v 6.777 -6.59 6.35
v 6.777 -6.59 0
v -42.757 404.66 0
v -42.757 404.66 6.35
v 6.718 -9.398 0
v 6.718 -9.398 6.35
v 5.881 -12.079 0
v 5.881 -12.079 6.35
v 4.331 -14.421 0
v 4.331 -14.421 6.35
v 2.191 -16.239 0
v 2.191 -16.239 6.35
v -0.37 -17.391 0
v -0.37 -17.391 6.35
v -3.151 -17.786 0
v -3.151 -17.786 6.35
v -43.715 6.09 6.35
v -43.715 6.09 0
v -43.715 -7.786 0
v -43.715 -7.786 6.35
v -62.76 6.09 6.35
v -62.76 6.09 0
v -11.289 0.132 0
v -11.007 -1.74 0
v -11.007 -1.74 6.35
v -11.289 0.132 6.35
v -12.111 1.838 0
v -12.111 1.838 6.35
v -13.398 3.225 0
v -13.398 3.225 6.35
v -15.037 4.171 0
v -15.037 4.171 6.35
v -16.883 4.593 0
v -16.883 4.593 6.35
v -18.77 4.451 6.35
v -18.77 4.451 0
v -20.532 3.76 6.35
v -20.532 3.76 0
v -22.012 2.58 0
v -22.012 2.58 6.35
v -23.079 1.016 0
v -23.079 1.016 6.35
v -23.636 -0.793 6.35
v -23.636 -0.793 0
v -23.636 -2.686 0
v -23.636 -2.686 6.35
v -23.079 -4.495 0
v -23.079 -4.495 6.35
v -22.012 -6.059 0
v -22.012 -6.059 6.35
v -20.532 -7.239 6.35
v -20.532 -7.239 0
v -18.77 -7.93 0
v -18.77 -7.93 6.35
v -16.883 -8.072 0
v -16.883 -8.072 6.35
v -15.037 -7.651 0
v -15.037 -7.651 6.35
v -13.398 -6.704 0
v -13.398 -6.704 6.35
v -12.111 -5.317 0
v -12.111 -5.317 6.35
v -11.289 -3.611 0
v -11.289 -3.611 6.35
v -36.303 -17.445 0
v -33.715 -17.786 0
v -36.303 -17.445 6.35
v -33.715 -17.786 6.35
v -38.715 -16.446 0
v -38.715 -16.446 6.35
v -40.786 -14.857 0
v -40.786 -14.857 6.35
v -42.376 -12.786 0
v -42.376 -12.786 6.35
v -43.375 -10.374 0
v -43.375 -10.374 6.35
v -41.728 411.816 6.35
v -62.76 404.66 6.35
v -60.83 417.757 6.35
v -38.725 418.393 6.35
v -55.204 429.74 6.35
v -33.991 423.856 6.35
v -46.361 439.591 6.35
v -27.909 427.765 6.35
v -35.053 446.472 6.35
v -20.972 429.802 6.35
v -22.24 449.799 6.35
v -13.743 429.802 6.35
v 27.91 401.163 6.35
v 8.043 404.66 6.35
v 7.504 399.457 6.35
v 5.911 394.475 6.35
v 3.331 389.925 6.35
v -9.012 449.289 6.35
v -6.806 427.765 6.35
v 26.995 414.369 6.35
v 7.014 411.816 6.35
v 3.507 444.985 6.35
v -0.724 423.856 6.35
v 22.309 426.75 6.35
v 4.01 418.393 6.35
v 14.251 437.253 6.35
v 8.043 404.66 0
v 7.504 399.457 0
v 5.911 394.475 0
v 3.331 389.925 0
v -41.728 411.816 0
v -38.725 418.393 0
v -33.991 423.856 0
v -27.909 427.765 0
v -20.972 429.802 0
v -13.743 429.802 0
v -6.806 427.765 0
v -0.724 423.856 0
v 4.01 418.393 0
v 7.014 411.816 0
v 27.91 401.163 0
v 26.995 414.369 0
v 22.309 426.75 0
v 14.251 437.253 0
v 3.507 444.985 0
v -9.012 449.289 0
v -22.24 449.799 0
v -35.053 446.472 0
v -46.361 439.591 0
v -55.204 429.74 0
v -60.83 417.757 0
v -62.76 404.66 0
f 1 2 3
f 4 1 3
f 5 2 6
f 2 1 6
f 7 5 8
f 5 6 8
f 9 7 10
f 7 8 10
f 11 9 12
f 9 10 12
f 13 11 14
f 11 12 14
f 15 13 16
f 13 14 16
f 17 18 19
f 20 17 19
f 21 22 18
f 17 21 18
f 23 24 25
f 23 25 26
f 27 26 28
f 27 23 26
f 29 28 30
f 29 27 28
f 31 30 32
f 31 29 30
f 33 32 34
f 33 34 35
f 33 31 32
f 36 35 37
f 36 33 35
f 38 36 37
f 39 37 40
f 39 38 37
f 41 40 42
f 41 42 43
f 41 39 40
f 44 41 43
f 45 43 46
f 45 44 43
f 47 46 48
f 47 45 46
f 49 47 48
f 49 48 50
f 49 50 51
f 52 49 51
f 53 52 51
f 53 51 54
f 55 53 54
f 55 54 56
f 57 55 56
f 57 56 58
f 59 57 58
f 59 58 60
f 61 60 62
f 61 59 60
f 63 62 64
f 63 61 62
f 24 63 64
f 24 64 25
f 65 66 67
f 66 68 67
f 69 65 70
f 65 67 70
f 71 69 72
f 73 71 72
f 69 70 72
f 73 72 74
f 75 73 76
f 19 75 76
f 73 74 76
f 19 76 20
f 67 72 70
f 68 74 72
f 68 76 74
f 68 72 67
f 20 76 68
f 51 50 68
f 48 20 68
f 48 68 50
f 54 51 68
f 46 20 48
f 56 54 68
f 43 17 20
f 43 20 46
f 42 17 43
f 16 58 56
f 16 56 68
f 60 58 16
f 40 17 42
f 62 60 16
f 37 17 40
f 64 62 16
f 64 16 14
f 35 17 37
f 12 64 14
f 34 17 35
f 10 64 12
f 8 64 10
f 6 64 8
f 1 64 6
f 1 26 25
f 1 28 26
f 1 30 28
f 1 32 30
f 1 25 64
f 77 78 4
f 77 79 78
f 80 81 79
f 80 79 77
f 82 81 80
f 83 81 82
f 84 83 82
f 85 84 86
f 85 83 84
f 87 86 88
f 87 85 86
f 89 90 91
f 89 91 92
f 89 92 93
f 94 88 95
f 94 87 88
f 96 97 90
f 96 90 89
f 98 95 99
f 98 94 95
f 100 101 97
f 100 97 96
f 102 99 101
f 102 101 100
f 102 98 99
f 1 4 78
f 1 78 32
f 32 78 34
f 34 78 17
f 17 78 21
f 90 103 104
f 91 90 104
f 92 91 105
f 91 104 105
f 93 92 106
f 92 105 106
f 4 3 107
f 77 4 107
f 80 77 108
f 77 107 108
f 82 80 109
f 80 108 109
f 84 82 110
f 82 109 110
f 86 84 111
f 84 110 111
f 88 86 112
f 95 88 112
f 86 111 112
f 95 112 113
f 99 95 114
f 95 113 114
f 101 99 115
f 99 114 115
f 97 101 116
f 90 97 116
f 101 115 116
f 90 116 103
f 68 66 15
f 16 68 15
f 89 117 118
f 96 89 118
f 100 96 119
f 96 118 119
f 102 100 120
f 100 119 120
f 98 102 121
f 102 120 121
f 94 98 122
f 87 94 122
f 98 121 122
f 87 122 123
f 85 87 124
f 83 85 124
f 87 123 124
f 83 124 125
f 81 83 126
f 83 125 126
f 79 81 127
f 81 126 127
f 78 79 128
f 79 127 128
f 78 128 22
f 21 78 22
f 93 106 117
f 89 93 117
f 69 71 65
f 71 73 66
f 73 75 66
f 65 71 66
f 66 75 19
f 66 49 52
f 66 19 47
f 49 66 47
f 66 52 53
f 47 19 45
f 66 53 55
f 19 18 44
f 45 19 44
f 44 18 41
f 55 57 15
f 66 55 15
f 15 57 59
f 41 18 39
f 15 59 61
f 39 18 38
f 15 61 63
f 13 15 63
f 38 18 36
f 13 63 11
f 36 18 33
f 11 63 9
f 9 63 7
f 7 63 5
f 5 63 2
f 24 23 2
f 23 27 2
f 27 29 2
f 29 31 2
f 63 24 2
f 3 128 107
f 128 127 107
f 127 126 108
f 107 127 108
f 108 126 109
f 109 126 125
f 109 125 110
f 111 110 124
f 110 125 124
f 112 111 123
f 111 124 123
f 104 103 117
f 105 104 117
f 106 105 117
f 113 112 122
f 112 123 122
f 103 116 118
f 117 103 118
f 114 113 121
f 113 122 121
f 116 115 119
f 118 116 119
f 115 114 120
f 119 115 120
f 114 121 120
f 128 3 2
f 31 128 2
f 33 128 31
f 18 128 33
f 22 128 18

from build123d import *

# Parameters (mm, degrees)
SKETCH1_R           = 6.35
BOSS_EXTRUDE1_DEPTH = 6.35
FILLET1_R           = 10


with BuildPart() as part:
    # Sketch1 → Boss-Extrude1 (new body)
    with BuildSketch(Plane.XY):
        with BuildLine():
            Line((3.331127109, 389.92455355), (27.90992579, 401.162728042))
            ThreePointArc((27.90992579, 401.162728042), (-15.607198263, 450.028916488), (-62.759573024, 404.660447113))
            Line((-62.759573024, 404.660447113), (-62.759573024, 6.090179643))
            Line((-62.759573024, 6.090179643), (-43.715258354, 6.090179643))
            Line((-43.715258354, 6.090179643), (-43.715258354, -17.785820357))
            Line((-43.715258354, -17.785820357), (8.125653236, -17.785820357))
            Line((8.125653236, -17.785820357), (-42.757358599, 404.660447113))
            ThreePointArc((-42.757358599, 404.660447113), (-17.357358599, 430.060447113), (8.042641401, 404.660447113))
            ThreePointArc((8.042641401, 404.660447113), (6.83610681, 396.925058855), (3.331127109, 389.92455355))
        make_face()
        with Locations((-17.357358599, -1.739552887)):
            Circle(SKETCH1_R, mode=Mode.SUBTRACT)
    extrude(amount=BOSS_EXTRUDE1_DEPTH)

    # Fillet1
    fillet1_edges = [part.edges().sort_by_distance(p)[0] for p in [
        (8.125653236, -17.785820357, 3.175),
        (-43.715258354, -17.785820357, 3.175),
    ]]
    fillet(fillet1_edges, radius=FILLET1_R)


solid = part.part
